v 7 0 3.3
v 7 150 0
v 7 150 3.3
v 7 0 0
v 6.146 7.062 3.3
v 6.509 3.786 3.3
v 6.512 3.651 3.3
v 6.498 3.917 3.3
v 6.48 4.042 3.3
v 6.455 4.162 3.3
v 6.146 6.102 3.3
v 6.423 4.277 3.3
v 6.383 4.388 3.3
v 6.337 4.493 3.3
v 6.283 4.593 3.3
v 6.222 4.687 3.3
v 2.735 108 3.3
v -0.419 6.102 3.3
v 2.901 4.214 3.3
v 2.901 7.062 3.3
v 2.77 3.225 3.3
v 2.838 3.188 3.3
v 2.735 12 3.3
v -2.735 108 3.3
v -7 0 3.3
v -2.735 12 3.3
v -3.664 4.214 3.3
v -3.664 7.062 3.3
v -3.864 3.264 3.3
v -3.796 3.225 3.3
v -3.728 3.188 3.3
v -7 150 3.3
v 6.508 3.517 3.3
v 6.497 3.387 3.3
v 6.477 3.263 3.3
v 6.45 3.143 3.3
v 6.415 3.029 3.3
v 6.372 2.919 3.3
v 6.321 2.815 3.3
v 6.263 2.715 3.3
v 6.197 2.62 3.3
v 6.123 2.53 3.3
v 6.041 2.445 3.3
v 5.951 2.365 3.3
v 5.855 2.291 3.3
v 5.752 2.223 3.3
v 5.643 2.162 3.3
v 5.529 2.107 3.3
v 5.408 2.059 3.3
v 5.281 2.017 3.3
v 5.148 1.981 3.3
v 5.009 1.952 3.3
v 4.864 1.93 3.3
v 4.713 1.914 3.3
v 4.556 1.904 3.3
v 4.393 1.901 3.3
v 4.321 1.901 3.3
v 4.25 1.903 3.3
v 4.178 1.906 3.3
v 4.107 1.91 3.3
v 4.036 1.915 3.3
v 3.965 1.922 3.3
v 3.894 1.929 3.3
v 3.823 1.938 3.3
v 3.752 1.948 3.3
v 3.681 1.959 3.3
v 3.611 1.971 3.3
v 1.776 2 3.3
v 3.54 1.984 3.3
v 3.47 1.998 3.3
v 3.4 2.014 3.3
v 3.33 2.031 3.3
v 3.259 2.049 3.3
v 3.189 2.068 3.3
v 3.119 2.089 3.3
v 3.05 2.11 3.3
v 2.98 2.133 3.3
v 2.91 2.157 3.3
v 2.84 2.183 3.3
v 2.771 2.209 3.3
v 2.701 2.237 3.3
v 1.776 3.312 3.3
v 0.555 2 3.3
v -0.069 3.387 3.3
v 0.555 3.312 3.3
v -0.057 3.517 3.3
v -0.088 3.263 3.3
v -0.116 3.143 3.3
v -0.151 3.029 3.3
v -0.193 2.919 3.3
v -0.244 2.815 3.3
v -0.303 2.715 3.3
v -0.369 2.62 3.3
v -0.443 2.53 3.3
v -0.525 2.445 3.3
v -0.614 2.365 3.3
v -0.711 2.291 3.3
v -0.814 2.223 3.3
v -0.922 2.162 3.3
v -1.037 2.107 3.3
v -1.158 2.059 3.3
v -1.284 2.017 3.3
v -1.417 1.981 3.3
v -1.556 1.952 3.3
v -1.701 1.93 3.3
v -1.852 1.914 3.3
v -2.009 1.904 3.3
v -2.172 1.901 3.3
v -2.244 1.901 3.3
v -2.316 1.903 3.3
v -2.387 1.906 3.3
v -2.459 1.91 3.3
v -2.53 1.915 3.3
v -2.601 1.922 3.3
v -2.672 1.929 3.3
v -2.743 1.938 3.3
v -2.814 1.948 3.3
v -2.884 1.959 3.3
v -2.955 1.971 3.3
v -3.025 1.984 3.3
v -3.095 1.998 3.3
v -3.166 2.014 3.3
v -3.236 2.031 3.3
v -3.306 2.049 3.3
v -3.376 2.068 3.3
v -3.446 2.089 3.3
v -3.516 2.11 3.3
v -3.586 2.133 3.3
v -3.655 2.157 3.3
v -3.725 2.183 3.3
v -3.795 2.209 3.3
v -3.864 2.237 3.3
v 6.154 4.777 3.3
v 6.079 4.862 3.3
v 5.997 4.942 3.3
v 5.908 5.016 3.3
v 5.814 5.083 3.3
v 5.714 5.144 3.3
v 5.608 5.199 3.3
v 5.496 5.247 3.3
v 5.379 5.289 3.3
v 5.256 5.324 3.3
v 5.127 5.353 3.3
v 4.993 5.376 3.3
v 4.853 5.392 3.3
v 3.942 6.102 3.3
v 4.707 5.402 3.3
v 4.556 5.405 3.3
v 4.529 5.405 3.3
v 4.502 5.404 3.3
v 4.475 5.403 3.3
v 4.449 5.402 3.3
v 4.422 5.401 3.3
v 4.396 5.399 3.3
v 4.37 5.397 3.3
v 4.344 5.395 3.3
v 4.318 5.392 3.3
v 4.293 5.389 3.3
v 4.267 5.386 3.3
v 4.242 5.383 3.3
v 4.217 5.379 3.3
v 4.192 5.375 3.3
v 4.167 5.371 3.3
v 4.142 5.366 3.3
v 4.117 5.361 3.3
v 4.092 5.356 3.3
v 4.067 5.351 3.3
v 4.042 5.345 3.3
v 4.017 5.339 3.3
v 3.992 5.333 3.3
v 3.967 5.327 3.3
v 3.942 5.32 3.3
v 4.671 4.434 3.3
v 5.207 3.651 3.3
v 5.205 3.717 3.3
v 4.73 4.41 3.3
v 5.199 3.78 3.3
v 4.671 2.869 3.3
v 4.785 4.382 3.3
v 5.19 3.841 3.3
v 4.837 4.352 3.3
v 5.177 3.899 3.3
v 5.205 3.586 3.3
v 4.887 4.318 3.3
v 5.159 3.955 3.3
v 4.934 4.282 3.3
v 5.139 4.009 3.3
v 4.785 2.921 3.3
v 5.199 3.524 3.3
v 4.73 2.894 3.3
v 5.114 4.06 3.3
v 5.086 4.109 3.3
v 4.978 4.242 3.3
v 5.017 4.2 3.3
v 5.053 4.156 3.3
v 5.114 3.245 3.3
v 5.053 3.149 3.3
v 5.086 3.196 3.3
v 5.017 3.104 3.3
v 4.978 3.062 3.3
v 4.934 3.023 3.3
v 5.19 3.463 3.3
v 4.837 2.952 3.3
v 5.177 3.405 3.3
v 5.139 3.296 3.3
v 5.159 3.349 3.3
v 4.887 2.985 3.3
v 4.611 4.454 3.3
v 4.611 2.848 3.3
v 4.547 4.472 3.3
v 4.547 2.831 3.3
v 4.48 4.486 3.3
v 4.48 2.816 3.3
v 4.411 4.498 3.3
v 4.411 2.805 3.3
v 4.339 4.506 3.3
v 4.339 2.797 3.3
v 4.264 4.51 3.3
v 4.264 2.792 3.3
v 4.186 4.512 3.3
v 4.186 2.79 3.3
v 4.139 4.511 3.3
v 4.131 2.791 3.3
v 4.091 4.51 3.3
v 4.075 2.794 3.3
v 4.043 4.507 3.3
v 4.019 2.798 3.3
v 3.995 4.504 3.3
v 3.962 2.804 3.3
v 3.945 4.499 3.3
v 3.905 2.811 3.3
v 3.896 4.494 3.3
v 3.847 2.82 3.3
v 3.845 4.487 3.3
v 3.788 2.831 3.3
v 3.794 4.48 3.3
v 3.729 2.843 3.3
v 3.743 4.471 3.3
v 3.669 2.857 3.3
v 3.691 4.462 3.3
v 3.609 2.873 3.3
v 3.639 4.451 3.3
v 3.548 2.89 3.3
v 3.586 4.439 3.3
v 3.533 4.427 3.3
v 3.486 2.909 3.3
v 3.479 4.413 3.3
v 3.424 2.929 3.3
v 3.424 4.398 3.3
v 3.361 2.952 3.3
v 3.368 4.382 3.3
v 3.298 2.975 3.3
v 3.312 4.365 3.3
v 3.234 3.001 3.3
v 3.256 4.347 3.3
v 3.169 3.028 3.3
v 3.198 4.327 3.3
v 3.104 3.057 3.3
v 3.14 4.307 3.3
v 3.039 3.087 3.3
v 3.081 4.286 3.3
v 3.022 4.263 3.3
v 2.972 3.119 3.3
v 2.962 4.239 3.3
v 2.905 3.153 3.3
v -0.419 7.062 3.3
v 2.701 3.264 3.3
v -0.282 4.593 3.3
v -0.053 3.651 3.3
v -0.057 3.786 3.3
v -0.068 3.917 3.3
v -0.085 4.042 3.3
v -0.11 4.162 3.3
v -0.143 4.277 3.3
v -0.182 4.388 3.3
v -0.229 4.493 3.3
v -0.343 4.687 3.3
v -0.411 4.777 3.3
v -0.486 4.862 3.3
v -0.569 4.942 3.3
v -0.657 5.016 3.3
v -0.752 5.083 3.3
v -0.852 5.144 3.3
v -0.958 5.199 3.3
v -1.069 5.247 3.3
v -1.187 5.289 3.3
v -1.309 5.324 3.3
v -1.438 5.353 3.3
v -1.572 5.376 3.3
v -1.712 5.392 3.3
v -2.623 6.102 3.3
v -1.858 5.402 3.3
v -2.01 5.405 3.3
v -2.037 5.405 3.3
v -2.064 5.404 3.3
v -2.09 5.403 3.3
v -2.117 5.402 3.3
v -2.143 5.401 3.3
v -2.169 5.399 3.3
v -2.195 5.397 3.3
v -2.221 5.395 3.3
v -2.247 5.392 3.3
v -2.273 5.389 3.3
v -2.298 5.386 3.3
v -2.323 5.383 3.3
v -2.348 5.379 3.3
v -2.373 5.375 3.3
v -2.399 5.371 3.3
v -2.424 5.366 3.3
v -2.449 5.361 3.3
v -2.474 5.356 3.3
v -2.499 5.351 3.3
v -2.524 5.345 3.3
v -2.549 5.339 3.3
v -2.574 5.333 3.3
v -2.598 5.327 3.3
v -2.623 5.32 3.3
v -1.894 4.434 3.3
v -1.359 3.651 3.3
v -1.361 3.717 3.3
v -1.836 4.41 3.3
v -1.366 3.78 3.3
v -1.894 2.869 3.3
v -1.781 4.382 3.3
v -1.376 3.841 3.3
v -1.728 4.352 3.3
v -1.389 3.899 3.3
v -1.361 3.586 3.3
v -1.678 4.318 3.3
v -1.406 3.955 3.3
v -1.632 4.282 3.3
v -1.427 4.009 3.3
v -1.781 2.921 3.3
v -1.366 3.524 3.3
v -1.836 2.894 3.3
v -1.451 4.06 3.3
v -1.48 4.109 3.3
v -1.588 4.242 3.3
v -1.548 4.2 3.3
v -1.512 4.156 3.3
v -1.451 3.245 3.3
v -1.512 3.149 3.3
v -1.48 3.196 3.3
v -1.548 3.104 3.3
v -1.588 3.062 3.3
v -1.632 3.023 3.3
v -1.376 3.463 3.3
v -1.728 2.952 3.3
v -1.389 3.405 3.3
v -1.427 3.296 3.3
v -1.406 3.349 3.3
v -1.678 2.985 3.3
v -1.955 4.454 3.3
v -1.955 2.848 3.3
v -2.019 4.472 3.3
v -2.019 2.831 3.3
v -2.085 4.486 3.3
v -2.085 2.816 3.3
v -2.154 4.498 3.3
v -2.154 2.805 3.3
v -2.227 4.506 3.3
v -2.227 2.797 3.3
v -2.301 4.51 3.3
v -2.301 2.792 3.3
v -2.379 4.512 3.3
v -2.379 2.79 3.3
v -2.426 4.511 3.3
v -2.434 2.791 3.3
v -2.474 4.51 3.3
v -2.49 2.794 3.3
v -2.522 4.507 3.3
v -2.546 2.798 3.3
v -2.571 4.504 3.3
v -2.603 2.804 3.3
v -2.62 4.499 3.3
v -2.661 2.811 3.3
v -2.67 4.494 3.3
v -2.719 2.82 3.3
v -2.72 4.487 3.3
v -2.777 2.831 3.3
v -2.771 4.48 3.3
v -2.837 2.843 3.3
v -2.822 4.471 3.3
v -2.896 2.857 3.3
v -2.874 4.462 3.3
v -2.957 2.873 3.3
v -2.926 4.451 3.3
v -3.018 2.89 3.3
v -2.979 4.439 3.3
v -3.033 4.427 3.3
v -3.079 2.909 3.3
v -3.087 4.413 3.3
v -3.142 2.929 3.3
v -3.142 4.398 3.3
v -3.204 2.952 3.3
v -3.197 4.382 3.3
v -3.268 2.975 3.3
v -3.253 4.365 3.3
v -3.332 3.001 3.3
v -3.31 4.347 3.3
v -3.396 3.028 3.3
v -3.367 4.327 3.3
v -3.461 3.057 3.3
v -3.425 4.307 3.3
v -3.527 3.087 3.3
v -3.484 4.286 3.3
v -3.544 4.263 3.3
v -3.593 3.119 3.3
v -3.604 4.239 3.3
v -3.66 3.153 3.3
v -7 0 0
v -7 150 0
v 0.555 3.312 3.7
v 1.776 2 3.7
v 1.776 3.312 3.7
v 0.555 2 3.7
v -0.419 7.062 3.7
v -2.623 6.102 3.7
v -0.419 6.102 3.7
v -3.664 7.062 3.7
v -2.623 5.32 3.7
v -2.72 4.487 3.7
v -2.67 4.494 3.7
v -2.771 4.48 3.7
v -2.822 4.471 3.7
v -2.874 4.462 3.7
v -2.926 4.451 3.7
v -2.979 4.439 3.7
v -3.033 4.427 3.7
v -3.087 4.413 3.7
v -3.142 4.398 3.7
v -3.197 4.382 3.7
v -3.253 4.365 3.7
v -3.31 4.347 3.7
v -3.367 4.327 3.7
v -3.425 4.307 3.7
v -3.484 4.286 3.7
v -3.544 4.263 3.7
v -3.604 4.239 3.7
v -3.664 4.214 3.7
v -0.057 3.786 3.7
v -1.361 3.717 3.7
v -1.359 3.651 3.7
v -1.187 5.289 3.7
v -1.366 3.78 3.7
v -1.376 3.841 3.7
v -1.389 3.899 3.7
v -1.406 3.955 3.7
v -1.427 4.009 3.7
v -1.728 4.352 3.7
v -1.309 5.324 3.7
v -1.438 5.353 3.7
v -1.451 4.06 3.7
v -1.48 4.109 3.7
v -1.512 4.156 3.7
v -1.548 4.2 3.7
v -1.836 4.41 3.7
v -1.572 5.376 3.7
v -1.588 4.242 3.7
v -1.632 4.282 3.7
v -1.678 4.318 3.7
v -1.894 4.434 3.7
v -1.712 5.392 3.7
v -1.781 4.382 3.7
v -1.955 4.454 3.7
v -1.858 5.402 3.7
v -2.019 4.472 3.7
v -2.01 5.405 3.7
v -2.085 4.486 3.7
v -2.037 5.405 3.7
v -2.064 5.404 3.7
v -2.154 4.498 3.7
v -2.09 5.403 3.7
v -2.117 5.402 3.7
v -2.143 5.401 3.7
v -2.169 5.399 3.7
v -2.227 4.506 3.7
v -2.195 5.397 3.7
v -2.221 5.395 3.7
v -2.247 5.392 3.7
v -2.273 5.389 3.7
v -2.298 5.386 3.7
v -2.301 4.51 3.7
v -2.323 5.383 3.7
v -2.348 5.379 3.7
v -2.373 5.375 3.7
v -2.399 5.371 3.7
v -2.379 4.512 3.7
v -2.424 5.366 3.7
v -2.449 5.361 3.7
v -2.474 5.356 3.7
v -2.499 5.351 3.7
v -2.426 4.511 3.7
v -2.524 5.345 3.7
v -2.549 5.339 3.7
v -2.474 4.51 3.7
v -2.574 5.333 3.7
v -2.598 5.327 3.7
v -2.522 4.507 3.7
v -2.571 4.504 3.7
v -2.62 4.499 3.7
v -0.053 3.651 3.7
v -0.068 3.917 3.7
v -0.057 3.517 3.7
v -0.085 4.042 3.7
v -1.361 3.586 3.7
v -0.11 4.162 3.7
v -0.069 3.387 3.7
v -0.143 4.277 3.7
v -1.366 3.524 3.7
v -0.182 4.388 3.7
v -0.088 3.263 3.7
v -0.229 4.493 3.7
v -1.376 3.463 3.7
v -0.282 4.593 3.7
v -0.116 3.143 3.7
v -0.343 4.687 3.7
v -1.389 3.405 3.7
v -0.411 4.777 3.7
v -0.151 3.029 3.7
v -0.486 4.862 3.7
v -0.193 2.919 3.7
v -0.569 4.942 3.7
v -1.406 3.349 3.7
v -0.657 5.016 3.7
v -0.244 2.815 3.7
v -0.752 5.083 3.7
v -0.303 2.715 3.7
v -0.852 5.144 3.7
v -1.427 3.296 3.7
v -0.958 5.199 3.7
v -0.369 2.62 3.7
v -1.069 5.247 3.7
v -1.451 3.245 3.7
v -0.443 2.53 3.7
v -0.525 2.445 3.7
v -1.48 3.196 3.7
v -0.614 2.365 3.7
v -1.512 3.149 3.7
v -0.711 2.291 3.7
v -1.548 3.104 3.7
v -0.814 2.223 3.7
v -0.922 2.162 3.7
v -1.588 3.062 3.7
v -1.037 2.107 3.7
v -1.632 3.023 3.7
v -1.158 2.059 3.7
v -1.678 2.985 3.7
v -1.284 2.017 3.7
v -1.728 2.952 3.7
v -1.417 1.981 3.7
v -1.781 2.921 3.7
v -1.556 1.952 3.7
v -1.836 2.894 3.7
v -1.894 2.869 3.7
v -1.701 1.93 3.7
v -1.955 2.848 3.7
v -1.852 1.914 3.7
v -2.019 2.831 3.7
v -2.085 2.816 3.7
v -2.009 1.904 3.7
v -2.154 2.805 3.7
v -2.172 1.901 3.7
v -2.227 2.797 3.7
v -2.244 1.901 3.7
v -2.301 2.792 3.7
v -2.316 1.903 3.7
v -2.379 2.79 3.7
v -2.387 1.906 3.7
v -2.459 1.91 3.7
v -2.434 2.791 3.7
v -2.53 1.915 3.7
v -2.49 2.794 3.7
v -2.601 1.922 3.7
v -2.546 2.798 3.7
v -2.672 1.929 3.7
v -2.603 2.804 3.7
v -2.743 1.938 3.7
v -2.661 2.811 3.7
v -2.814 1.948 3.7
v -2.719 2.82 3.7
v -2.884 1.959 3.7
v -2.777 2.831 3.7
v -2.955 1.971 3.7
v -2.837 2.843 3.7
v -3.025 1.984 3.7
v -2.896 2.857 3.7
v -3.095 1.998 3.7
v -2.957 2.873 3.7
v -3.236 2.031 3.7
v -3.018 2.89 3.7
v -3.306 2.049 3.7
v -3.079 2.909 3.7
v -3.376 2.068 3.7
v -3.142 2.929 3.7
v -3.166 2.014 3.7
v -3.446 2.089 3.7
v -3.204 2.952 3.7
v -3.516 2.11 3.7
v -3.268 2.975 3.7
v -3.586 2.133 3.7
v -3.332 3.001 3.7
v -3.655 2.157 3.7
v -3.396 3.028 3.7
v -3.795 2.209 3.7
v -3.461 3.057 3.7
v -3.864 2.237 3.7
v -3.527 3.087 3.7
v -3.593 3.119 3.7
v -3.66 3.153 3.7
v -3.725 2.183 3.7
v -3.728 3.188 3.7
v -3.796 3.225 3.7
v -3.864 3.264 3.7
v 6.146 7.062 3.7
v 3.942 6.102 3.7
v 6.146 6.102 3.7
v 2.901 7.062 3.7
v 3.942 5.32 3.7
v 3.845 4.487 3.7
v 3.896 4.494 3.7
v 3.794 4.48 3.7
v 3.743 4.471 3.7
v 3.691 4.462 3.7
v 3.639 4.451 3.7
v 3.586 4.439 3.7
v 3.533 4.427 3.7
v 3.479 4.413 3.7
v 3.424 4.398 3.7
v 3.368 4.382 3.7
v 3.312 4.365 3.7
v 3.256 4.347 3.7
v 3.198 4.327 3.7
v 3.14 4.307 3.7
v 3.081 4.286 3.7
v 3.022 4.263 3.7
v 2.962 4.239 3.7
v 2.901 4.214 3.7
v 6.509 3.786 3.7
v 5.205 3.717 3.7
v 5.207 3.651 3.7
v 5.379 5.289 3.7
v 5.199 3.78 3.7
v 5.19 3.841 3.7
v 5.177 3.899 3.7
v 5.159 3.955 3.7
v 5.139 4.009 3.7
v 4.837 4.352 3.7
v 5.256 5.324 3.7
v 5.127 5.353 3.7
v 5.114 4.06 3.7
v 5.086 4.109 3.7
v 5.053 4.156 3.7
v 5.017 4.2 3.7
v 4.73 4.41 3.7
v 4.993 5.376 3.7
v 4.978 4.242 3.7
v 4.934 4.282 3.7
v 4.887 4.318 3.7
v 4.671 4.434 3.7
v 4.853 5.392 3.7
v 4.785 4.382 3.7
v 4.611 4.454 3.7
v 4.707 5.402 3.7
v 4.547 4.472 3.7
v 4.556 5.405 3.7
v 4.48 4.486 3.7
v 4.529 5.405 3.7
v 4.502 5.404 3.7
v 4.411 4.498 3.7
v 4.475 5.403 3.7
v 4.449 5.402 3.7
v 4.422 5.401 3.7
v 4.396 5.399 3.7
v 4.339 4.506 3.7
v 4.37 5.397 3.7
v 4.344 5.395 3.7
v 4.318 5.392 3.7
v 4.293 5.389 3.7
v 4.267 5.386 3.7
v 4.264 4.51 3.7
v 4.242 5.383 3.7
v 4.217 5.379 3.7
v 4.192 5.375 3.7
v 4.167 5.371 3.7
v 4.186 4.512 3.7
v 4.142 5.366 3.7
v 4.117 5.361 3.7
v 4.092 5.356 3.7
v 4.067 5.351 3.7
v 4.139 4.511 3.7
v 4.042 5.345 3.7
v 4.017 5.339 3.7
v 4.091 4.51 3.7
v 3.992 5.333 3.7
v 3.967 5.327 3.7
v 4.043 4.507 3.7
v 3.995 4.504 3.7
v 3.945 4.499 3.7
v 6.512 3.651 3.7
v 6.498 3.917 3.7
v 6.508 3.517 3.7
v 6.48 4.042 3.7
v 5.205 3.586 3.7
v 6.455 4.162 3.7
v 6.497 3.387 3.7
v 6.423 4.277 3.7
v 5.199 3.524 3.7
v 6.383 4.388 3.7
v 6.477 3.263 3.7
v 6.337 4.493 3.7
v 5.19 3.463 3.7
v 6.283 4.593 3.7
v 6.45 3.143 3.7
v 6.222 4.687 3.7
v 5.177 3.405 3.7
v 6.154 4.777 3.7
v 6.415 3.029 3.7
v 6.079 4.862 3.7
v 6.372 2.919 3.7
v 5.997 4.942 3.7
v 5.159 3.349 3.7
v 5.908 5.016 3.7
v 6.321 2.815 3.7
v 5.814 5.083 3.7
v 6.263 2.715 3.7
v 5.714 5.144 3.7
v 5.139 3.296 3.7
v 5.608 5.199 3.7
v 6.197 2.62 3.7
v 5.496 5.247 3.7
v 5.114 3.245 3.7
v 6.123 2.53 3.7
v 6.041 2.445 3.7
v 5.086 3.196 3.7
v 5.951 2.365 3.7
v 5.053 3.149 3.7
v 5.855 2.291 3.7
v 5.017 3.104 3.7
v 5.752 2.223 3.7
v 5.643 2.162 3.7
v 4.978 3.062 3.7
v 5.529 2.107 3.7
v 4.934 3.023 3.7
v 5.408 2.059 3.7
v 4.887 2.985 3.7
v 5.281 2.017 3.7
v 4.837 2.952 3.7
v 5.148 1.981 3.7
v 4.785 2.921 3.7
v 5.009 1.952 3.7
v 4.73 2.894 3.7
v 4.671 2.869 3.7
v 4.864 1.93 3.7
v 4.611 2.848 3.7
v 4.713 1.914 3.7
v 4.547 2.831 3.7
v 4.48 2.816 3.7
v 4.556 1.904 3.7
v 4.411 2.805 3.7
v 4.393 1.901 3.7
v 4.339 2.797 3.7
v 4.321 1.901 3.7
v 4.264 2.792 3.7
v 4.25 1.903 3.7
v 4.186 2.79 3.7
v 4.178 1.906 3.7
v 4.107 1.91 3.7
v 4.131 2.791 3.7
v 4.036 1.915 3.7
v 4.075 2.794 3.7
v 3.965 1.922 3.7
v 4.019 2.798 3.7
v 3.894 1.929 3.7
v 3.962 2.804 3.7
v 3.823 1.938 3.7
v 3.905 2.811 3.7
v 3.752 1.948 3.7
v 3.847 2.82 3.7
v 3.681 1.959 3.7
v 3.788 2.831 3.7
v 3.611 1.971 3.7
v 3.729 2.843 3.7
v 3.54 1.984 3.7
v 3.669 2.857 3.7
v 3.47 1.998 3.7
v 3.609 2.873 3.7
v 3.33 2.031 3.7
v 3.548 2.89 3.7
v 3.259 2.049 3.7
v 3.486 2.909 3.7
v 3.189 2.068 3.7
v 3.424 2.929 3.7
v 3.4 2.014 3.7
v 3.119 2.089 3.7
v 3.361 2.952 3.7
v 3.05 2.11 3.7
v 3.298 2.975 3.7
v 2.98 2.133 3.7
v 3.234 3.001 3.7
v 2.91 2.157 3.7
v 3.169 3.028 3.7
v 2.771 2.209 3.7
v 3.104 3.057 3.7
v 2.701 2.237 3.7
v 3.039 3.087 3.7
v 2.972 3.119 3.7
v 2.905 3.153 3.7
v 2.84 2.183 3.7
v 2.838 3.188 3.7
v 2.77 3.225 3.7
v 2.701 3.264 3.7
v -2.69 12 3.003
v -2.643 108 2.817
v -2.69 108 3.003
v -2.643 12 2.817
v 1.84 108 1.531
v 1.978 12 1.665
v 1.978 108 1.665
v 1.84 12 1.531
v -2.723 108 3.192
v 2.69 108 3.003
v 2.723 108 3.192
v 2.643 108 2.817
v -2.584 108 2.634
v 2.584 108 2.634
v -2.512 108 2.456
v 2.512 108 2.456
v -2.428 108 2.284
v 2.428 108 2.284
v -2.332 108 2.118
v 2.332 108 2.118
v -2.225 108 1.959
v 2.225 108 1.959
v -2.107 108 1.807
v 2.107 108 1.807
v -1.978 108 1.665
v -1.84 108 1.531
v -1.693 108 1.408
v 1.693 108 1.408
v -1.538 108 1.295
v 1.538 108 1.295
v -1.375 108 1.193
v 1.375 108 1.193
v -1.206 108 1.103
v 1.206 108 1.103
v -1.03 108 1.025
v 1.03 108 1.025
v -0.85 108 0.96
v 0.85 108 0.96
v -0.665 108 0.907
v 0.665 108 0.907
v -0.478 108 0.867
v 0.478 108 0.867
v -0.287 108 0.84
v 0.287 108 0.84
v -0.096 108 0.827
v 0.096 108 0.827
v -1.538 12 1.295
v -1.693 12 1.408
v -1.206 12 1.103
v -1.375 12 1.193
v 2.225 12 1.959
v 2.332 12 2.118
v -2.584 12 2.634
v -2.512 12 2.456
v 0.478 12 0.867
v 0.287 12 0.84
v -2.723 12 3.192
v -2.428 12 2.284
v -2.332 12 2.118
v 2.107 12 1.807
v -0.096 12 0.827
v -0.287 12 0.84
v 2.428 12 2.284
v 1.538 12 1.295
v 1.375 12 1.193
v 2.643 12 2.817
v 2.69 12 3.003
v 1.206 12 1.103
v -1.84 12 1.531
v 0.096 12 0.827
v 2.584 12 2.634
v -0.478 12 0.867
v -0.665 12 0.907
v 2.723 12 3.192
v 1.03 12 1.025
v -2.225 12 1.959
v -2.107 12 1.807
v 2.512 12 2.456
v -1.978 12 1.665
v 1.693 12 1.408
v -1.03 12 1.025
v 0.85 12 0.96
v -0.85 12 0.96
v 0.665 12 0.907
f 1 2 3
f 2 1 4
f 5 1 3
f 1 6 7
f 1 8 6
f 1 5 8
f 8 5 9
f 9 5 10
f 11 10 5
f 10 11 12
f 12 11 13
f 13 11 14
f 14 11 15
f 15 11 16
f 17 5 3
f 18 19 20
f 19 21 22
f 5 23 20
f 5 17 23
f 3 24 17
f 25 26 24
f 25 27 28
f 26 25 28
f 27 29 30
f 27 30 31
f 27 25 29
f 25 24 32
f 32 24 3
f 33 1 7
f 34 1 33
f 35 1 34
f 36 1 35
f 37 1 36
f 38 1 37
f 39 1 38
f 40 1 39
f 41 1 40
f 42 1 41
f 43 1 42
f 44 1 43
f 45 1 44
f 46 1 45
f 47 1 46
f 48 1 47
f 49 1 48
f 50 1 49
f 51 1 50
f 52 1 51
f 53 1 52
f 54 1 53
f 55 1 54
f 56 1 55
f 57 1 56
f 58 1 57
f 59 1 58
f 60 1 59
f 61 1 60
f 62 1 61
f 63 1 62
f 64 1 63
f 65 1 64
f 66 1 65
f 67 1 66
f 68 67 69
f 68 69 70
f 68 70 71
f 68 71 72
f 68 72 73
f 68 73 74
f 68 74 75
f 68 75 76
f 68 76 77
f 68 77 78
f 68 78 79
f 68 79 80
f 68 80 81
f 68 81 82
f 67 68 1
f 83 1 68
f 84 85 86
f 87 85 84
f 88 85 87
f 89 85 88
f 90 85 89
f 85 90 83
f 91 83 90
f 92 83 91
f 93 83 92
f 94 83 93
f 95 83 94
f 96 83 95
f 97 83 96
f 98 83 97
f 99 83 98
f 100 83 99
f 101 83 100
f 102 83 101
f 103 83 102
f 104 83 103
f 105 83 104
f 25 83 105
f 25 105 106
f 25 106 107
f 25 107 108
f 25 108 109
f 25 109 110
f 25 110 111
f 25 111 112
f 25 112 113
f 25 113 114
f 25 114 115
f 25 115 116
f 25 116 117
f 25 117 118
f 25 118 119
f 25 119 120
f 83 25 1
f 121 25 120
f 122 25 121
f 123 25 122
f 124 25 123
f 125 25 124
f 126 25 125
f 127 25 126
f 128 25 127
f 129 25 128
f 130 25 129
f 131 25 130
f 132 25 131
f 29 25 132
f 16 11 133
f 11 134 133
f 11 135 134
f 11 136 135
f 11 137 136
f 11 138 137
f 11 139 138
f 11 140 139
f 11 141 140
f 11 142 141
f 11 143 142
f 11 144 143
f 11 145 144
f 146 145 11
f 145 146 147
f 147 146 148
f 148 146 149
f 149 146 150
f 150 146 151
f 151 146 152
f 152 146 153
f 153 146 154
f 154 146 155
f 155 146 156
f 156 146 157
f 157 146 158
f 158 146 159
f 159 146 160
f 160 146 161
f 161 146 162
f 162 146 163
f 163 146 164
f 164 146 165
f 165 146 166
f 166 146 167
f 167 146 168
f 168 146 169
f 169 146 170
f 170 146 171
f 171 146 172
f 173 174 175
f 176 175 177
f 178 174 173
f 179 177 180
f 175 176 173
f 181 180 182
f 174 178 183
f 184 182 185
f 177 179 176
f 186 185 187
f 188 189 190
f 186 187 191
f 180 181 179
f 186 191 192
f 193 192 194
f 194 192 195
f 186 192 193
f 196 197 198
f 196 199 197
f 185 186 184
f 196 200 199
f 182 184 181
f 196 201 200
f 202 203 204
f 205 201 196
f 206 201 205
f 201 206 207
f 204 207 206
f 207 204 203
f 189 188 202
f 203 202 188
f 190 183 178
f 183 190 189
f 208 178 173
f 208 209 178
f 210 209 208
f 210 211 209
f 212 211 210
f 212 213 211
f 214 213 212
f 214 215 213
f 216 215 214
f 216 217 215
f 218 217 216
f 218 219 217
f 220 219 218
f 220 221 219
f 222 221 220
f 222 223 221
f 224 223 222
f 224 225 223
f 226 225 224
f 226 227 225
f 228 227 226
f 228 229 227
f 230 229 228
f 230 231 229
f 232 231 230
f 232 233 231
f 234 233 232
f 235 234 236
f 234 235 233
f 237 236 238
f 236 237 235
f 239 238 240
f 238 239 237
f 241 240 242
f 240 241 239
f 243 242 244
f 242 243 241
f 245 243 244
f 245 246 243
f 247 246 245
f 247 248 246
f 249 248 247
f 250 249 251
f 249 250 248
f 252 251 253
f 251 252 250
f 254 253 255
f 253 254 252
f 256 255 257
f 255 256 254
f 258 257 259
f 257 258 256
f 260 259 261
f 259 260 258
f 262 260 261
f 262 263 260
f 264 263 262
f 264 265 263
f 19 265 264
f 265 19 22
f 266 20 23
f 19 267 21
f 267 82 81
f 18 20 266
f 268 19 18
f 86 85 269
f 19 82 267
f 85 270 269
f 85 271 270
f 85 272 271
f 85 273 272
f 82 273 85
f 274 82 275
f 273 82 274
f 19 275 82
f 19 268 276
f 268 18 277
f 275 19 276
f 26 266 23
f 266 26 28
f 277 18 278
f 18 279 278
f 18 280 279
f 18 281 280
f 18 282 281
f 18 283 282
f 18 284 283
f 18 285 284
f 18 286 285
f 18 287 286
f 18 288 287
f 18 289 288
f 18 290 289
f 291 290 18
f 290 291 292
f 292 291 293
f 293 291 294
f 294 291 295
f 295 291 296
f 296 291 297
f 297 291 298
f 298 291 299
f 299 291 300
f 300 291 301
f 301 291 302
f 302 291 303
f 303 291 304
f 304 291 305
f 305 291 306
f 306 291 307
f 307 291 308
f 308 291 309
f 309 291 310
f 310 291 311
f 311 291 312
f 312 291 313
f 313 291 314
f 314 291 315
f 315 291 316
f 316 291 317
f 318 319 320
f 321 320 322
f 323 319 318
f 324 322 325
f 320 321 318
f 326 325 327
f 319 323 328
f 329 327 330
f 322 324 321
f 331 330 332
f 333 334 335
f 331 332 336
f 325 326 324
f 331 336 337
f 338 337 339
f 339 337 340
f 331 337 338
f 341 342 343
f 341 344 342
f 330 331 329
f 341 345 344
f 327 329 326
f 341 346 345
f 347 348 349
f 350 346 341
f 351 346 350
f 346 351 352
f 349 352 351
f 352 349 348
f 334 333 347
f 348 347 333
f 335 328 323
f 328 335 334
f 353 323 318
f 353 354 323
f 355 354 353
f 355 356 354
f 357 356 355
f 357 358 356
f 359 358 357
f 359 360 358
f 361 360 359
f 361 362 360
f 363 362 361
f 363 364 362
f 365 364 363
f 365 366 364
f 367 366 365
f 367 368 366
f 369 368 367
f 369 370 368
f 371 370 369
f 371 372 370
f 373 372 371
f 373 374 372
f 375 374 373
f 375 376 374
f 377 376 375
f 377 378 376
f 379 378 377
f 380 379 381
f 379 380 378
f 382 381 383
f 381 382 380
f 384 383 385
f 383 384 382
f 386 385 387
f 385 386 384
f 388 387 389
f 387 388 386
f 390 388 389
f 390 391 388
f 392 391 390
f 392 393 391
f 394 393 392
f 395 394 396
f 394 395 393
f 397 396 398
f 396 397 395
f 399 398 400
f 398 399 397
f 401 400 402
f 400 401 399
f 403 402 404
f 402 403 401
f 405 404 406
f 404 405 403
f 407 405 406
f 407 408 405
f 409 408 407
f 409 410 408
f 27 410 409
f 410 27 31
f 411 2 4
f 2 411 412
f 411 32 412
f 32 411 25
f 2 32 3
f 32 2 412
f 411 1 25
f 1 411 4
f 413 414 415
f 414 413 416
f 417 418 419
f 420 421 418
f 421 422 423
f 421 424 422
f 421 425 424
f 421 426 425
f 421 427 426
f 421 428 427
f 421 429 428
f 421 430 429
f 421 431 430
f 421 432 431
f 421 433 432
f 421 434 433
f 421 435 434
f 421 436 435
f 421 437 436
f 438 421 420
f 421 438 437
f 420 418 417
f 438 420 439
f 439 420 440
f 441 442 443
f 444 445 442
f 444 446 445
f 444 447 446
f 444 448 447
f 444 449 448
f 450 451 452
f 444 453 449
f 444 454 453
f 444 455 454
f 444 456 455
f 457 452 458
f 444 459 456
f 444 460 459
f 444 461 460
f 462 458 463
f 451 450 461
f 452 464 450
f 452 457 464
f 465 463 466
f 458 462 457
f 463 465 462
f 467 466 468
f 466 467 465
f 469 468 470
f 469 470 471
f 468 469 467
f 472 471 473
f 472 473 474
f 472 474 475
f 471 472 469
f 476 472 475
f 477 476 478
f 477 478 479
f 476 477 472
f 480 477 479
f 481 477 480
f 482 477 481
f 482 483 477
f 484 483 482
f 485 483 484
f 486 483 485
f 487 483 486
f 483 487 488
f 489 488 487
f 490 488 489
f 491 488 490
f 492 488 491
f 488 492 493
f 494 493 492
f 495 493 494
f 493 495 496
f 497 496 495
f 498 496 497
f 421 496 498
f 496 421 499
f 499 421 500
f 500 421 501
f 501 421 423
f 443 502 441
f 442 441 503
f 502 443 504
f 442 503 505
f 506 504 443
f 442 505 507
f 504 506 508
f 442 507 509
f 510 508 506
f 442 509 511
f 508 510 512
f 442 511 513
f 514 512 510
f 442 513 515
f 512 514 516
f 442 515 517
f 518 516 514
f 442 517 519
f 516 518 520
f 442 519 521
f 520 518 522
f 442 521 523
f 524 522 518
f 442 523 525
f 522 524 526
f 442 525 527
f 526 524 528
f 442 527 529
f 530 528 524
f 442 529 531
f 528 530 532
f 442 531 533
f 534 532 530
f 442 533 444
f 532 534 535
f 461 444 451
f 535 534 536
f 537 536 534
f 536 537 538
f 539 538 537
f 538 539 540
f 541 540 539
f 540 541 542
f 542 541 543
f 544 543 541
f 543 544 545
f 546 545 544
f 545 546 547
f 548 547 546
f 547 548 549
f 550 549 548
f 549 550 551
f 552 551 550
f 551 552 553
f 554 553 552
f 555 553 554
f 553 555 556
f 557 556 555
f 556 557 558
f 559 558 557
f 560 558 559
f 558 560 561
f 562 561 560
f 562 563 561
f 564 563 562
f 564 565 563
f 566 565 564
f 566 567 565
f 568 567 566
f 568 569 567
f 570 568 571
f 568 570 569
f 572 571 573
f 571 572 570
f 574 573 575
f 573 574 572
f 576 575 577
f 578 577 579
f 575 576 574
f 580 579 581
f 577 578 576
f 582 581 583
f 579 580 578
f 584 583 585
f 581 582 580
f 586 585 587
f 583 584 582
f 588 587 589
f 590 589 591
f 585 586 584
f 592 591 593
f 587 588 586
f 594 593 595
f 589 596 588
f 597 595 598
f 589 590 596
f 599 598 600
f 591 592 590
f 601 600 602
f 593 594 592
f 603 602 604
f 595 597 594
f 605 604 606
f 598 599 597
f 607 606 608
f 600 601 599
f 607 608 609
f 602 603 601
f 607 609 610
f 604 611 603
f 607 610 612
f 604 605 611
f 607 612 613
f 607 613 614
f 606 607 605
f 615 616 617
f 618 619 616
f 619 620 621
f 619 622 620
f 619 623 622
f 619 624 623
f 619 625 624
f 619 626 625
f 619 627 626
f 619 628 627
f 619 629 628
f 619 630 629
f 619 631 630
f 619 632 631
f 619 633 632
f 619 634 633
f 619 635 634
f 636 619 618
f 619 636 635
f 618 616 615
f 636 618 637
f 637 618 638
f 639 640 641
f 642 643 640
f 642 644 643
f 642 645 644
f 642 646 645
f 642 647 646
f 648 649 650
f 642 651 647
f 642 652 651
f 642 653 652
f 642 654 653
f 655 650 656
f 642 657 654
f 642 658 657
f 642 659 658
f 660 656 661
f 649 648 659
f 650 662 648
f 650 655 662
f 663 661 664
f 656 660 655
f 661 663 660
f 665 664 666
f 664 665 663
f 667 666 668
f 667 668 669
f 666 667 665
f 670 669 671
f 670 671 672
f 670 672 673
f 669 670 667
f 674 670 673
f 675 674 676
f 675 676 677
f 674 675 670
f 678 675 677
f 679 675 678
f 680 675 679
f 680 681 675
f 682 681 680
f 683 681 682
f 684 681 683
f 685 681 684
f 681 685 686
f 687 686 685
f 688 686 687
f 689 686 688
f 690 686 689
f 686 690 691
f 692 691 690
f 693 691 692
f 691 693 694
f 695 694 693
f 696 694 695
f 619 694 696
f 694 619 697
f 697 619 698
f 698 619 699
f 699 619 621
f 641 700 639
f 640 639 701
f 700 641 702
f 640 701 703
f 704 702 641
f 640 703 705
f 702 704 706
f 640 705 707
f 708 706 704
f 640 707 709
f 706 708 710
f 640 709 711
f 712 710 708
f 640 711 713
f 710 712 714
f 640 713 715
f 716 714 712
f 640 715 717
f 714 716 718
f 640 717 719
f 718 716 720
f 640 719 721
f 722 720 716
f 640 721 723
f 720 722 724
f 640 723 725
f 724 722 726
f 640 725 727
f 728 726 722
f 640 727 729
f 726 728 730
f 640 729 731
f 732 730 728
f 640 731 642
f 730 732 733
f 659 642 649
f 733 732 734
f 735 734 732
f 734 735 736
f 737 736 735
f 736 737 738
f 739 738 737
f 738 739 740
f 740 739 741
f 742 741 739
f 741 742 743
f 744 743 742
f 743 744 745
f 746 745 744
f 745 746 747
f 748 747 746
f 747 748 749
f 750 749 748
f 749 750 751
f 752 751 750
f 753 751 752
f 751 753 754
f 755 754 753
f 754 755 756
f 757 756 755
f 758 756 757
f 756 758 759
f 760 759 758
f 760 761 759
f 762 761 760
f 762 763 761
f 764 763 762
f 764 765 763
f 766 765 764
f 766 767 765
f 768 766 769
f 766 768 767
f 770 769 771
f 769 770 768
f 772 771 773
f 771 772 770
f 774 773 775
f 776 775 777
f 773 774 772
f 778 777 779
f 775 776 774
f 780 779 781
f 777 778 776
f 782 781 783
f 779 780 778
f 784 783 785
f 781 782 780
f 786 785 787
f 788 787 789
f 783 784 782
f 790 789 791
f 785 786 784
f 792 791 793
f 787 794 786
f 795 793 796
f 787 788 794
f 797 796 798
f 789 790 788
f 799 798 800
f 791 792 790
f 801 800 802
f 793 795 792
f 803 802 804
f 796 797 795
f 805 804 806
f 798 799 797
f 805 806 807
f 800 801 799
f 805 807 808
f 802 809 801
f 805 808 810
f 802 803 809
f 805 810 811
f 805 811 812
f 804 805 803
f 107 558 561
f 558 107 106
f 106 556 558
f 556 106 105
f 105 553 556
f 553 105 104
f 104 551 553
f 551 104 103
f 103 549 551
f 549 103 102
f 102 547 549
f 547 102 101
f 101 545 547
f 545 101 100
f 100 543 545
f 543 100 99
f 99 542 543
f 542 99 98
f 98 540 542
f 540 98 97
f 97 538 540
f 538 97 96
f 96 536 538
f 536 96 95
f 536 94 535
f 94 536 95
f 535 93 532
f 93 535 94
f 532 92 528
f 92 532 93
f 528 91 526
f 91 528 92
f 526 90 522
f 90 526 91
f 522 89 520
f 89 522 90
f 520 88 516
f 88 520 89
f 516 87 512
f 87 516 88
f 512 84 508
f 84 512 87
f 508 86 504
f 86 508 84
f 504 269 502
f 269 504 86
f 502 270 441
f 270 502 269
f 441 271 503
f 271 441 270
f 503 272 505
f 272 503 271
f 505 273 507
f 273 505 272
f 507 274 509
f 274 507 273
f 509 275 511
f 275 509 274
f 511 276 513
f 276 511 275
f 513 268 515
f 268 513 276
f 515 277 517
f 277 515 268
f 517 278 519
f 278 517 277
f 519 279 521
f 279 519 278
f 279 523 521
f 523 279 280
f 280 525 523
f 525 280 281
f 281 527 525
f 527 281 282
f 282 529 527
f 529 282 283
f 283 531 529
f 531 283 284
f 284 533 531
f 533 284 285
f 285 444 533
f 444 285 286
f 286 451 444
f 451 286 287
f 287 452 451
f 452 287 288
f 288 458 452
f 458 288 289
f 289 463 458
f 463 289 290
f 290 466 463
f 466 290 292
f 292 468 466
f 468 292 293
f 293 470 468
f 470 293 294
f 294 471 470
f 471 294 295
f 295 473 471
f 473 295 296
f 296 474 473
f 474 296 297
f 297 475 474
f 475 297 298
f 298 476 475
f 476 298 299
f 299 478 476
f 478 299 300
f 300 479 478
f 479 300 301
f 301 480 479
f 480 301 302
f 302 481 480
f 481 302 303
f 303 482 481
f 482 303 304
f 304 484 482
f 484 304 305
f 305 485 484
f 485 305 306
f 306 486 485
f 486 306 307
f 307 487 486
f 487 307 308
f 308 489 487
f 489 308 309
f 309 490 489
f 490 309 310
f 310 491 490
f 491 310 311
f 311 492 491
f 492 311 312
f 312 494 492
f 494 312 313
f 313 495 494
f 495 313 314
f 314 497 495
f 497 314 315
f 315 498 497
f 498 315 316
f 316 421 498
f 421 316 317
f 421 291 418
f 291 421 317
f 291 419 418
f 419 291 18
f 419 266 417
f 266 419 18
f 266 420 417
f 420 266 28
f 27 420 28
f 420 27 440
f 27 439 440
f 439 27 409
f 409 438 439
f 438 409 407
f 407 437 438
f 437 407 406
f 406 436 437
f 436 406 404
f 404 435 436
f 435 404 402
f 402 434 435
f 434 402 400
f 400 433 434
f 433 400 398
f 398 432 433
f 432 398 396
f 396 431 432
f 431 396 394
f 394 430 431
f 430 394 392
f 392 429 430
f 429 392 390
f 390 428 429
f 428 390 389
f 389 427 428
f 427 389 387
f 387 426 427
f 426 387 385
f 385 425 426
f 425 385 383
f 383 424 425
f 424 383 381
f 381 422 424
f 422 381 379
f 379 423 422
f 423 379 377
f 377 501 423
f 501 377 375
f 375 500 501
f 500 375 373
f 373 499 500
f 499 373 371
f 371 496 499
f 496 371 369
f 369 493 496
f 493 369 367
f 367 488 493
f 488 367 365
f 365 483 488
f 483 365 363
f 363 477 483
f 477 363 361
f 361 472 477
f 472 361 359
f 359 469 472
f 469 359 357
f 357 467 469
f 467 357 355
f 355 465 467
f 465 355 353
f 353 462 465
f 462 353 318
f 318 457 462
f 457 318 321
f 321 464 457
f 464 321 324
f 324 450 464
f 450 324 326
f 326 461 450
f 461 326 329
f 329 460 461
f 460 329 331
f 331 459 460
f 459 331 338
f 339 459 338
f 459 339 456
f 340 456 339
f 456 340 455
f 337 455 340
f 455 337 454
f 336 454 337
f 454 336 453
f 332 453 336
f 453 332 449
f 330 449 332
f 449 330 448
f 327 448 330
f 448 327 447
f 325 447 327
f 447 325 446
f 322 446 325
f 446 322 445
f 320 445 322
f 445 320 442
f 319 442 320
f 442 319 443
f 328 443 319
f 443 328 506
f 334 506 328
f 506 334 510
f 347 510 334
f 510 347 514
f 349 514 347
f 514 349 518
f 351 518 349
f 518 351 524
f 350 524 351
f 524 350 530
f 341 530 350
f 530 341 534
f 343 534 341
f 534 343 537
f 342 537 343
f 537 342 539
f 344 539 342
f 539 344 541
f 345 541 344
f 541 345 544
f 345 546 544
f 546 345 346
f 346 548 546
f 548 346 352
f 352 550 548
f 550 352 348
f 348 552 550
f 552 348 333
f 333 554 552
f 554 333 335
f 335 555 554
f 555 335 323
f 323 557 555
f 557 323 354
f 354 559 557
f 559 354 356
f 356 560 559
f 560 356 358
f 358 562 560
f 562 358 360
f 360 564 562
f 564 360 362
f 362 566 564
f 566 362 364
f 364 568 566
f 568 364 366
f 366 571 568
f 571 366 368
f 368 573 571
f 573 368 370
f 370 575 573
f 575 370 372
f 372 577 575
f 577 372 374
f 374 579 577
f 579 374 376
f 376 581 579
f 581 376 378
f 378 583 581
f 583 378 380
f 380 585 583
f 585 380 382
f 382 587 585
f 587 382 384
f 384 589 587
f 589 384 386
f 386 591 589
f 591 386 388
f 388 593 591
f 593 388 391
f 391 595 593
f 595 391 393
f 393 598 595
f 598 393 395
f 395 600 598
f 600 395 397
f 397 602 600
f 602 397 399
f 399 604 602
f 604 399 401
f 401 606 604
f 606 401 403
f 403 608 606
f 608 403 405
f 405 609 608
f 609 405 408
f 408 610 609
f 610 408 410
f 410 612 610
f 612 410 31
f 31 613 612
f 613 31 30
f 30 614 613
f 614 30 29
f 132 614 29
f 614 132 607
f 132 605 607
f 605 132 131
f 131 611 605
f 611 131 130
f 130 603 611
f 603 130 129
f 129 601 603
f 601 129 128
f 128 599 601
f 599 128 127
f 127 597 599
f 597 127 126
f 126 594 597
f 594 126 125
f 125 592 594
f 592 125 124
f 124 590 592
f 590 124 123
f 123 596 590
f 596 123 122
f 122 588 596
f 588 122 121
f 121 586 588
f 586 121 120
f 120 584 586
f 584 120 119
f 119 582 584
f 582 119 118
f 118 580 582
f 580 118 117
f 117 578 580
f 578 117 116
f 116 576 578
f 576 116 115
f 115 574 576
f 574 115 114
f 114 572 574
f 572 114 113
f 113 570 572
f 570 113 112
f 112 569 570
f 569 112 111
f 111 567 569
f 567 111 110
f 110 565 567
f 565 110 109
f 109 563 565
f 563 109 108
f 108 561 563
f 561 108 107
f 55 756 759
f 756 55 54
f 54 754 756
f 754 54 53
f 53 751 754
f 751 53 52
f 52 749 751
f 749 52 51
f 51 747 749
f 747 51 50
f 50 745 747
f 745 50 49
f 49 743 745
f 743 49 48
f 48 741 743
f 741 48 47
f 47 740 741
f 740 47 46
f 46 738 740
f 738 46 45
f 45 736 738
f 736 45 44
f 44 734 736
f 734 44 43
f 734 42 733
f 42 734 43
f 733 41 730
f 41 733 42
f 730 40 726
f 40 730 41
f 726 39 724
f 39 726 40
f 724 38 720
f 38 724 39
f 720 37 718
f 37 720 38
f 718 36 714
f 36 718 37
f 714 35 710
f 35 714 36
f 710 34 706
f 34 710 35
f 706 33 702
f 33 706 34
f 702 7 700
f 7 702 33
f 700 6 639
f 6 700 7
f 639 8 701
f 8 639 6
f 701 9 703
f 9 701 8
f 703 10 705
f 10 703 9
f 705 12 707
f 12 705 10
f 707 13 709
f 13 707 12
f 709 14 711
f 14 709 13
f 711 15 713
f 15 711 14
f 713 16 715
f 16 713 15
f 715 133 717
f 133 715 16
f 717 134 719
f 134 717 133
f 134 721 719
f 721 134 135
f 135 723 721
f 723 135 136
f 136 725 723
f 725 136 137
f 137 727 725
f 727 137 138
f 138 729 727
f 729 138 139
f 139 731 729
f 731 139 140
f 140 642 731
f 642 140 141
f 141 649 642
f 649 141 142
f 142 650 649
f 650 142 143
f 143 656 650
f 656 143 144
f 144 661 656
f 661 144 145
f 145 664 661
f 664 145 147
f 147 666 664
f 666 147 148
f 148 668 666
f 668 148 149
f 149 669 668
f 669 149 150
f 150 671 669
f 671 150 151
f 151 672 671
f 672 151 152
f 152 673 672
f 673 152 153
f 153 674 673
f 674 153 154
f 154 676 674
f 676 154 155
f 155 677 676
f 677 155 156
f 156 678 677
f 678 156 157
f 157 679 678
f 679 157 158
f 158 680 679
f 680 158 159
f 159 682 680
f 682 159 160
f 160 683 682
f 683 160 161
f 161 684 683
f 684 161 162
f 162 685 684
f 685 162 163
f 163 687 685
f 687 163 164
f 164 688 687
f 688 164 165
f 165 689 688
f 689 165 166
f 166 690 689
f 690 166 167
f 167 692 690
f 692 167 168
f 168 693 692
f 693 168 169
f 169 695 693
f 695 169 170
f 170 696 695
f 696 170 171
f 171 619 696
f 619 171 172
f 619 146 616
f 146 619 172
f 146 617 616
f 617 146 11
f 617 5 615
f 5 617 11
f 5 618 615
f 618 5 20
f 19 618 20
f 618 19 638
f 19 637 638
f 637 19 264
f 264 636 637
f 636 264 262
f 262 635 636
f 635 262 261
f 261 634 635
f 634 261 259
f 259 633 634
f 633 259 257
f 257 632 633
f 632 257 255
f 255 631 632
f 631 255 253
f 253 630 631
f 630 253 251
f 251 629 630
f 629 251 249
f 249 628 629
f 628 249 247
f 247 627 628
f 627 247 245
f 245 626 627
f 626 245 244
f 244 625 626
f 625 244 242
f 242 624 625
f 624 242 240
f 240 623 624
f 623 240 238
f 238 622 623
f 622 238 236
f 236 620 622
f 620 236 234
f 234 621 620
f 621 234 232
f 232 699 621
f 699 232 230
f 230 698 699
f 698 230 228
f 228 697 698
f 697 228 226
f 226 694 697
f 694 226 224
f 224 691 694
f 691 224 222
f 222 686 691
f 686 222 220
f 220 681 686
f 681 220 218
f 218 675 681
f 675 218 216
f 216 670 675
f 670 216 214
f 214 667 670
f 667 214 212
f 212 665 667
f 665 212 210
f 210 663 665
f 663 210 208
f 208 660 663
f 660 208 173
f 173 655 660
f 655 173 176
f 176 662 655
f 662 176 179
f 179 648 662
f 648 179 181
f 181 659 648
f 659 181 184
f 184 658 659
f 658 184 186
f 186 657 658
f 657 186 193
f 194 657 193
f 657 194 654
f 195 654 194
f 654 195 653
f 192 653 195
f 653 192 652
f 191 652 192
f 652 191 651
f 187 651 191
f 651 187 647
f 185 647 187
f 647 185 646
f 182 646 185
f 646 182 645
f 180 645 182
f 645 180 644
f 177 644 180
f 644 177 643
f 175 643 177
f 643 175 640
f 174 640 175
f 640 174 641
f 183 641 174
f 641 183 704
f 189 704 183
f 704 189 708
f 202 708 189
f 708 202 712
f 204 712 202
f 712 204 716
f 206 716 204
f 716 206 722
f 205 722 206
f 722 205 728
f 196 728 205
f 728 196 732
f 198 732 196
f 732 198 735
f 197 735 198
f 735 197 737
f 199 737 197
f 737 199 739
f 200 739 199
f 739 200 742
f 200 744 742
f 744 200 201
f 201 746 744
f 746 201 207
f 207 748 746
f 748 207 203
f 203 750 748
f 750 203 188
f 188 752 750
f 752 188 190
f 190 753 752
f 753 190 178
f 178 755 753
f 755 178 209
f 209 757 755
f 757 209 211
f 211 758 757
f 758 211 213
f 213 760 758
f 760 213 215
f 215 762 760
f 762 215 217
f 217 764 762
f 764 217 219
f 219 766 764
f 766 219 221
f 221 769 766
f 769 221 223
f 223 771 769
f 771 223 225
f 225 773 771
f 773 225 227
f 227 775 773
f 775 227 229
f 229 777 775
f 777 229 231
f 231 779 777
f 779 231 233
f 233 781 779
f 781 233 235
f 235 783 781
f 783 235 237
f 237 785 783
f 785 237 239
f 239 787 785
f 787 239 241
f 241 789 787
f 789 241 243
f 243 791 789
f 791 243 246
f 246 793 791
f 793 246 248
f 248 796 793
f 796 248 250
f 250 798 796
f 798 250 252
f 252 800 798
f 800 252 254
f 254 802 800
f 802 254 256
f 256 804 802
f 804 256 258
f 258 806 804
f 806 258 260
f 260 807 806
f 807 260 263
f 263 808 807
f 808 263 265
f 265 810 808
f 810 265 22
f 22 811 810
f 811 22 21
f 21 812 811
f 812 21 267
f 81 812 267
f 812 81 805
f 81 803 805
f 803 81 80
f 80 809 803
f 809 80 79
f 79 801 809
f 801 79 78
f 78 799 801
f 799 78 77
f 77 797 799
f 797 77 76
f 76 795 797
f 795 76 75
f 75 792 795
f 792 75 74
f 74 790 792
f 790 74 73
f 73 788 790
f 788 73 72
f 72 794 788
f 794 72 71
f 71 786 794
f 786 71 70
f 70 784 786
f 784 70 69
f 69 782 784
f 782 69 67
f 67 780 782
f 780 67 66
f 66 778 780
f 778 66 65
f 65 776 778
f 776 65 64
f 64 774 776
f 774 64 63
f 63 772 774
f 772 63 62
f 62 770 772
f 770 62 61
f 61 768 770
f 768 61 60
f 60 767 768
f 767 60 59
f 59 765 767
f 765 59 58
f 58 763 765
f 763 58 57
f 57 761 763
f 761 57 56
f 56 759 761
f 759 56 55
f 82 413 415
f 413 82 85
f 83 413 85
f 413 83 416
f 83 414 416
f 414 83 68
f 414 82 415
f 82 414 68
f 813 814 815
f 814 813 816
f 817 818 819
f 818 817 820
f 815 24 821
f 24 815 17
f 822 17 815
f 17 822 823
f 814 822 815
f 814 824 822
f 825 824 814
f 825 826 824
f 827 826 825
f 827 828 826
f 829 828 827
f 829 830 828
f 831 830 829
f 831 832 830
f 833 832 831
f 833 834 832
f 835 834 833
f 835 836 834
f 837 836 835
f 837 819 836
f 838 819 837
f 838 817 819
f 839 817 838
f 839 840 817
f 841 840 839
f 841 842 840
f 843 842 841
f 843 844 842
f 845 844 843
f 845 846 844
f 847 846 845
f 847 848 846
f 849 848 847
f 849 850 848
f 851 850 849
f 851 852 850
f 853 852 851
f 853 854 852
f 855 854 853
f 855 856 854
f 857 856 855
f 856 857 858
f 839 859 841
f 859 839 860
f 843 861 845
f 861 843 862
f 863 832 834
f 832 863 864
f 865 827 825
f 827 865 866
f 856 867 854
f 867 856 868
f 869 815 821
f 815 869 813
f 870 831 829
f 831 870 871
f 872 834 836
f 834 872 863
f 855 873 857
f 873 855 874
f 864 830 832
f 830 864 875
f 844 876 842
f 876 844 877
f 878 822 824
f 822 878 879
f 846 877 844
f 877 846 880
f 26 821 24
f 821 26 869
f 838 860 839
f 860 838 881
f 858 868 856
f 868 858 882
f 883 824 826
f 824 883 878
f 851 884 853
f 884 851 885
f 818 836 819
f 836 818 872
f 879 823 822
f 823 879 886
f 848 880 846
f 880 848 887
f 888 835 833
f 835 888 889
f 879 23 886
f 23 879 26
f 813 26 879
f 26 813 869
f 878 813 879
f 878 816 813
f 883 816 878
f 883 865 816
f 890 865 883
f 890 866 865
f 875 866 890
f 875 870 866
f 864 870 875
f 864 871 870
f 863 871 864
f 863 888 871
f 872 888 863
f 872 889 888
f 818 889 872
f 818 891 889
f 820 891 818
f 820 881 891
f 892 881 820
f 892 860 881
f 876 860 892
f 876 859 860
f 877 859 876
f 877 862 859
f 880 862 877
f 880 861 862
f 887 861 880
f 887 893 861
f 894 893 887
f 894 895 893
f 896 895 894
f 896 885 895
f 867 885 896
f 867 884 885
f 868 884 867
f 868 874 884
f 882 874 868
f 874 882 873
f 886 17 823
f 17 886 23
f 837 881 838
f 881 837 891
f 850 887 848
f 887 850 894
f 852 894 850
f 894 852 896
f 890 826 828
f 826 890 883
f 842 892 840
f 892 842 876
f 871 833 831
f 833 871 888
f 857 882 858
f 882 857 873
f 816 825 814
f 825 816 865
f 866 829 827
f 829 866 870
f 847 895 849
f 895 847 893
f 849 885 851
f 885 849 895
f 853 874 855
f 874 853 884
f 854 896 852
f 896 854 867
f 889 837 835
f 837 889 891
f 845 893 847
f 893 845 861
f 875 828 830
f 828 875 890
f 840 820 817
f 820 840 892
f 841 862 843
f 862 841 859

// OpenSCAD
// file: module/drill-bit-storage.scad
/*
    Drill bit storage
*/

$fn=90;  // accuracy


// Constants (Don't change)
storageLenght = 100; // Not Bit lenght
maxBitLenght  = 70;  // Check bit lenght
storageWidth  = 10;  // Minimum width

// Bit dependent
bitDiameter = 4.0;



module drillBitStorage (bitDiameter,maxBitLenght,
	storageWidth,storageLenght){

// Automatic Variables  (Don't change)
diameterText      = str(bitDiameter);
storageHight      = bitDiameter*0.6; 
bitRadius         = bitDiameter/2;
bitPositionHeight = storageHight+bitDiameter*0.05; 


// Delition for crating drill track
difference() {

// Union for text and storage
union(){

// Storage 
translate([
    -storageWidth/2,    // Centering
    0, 
    0
    ]) 
cube(size = [
    storageWidth,
    storageLenght,
    storageHight
    ]);

// Milimiter dimension text
translate([
    -4.4,               // Fine deling x-axis
    2,                  // Fine deling y-axis 
    storageHight         
    ])
linear_extrude(height=0.4)text(
    diameterText,  // Dynamic text
    size=5,
    font="tohoma:style=bold",
    spacing=0.9
    );
    
// End of union    
}  

// Begining of Delition
// Drill tracl
rotate([90,0,0])
translate([
    0,                   // x-axis
    bitPositionHeight,   // Z-axis
    -(maxBitLenght+12)    // y-axis
    ])  
cylinder(
    h = maxBitLenght,    // y-axis
    r = bitRadius        // x-axis 
    );      

// End of Delition
}}
// main file
/*
    Drill bit storage
*/

$fn=90;  // accuracy

// import module
use <module/drill-bit-storage.scad>;



// Tootale lenght of the unit
storageLenght = 150; 

// Width of the unit
storageWidth  = 14;  // (Constant under 4mm)  

// The lenght of the drill bit
maxBitLenght  = 96;  

// Drill bit diameter  
bitDiameter = 5.5;


// Call the module
drillBitStorage 
    (bitDiameter,maxBitLenght,storageWidth,storageLenght);
